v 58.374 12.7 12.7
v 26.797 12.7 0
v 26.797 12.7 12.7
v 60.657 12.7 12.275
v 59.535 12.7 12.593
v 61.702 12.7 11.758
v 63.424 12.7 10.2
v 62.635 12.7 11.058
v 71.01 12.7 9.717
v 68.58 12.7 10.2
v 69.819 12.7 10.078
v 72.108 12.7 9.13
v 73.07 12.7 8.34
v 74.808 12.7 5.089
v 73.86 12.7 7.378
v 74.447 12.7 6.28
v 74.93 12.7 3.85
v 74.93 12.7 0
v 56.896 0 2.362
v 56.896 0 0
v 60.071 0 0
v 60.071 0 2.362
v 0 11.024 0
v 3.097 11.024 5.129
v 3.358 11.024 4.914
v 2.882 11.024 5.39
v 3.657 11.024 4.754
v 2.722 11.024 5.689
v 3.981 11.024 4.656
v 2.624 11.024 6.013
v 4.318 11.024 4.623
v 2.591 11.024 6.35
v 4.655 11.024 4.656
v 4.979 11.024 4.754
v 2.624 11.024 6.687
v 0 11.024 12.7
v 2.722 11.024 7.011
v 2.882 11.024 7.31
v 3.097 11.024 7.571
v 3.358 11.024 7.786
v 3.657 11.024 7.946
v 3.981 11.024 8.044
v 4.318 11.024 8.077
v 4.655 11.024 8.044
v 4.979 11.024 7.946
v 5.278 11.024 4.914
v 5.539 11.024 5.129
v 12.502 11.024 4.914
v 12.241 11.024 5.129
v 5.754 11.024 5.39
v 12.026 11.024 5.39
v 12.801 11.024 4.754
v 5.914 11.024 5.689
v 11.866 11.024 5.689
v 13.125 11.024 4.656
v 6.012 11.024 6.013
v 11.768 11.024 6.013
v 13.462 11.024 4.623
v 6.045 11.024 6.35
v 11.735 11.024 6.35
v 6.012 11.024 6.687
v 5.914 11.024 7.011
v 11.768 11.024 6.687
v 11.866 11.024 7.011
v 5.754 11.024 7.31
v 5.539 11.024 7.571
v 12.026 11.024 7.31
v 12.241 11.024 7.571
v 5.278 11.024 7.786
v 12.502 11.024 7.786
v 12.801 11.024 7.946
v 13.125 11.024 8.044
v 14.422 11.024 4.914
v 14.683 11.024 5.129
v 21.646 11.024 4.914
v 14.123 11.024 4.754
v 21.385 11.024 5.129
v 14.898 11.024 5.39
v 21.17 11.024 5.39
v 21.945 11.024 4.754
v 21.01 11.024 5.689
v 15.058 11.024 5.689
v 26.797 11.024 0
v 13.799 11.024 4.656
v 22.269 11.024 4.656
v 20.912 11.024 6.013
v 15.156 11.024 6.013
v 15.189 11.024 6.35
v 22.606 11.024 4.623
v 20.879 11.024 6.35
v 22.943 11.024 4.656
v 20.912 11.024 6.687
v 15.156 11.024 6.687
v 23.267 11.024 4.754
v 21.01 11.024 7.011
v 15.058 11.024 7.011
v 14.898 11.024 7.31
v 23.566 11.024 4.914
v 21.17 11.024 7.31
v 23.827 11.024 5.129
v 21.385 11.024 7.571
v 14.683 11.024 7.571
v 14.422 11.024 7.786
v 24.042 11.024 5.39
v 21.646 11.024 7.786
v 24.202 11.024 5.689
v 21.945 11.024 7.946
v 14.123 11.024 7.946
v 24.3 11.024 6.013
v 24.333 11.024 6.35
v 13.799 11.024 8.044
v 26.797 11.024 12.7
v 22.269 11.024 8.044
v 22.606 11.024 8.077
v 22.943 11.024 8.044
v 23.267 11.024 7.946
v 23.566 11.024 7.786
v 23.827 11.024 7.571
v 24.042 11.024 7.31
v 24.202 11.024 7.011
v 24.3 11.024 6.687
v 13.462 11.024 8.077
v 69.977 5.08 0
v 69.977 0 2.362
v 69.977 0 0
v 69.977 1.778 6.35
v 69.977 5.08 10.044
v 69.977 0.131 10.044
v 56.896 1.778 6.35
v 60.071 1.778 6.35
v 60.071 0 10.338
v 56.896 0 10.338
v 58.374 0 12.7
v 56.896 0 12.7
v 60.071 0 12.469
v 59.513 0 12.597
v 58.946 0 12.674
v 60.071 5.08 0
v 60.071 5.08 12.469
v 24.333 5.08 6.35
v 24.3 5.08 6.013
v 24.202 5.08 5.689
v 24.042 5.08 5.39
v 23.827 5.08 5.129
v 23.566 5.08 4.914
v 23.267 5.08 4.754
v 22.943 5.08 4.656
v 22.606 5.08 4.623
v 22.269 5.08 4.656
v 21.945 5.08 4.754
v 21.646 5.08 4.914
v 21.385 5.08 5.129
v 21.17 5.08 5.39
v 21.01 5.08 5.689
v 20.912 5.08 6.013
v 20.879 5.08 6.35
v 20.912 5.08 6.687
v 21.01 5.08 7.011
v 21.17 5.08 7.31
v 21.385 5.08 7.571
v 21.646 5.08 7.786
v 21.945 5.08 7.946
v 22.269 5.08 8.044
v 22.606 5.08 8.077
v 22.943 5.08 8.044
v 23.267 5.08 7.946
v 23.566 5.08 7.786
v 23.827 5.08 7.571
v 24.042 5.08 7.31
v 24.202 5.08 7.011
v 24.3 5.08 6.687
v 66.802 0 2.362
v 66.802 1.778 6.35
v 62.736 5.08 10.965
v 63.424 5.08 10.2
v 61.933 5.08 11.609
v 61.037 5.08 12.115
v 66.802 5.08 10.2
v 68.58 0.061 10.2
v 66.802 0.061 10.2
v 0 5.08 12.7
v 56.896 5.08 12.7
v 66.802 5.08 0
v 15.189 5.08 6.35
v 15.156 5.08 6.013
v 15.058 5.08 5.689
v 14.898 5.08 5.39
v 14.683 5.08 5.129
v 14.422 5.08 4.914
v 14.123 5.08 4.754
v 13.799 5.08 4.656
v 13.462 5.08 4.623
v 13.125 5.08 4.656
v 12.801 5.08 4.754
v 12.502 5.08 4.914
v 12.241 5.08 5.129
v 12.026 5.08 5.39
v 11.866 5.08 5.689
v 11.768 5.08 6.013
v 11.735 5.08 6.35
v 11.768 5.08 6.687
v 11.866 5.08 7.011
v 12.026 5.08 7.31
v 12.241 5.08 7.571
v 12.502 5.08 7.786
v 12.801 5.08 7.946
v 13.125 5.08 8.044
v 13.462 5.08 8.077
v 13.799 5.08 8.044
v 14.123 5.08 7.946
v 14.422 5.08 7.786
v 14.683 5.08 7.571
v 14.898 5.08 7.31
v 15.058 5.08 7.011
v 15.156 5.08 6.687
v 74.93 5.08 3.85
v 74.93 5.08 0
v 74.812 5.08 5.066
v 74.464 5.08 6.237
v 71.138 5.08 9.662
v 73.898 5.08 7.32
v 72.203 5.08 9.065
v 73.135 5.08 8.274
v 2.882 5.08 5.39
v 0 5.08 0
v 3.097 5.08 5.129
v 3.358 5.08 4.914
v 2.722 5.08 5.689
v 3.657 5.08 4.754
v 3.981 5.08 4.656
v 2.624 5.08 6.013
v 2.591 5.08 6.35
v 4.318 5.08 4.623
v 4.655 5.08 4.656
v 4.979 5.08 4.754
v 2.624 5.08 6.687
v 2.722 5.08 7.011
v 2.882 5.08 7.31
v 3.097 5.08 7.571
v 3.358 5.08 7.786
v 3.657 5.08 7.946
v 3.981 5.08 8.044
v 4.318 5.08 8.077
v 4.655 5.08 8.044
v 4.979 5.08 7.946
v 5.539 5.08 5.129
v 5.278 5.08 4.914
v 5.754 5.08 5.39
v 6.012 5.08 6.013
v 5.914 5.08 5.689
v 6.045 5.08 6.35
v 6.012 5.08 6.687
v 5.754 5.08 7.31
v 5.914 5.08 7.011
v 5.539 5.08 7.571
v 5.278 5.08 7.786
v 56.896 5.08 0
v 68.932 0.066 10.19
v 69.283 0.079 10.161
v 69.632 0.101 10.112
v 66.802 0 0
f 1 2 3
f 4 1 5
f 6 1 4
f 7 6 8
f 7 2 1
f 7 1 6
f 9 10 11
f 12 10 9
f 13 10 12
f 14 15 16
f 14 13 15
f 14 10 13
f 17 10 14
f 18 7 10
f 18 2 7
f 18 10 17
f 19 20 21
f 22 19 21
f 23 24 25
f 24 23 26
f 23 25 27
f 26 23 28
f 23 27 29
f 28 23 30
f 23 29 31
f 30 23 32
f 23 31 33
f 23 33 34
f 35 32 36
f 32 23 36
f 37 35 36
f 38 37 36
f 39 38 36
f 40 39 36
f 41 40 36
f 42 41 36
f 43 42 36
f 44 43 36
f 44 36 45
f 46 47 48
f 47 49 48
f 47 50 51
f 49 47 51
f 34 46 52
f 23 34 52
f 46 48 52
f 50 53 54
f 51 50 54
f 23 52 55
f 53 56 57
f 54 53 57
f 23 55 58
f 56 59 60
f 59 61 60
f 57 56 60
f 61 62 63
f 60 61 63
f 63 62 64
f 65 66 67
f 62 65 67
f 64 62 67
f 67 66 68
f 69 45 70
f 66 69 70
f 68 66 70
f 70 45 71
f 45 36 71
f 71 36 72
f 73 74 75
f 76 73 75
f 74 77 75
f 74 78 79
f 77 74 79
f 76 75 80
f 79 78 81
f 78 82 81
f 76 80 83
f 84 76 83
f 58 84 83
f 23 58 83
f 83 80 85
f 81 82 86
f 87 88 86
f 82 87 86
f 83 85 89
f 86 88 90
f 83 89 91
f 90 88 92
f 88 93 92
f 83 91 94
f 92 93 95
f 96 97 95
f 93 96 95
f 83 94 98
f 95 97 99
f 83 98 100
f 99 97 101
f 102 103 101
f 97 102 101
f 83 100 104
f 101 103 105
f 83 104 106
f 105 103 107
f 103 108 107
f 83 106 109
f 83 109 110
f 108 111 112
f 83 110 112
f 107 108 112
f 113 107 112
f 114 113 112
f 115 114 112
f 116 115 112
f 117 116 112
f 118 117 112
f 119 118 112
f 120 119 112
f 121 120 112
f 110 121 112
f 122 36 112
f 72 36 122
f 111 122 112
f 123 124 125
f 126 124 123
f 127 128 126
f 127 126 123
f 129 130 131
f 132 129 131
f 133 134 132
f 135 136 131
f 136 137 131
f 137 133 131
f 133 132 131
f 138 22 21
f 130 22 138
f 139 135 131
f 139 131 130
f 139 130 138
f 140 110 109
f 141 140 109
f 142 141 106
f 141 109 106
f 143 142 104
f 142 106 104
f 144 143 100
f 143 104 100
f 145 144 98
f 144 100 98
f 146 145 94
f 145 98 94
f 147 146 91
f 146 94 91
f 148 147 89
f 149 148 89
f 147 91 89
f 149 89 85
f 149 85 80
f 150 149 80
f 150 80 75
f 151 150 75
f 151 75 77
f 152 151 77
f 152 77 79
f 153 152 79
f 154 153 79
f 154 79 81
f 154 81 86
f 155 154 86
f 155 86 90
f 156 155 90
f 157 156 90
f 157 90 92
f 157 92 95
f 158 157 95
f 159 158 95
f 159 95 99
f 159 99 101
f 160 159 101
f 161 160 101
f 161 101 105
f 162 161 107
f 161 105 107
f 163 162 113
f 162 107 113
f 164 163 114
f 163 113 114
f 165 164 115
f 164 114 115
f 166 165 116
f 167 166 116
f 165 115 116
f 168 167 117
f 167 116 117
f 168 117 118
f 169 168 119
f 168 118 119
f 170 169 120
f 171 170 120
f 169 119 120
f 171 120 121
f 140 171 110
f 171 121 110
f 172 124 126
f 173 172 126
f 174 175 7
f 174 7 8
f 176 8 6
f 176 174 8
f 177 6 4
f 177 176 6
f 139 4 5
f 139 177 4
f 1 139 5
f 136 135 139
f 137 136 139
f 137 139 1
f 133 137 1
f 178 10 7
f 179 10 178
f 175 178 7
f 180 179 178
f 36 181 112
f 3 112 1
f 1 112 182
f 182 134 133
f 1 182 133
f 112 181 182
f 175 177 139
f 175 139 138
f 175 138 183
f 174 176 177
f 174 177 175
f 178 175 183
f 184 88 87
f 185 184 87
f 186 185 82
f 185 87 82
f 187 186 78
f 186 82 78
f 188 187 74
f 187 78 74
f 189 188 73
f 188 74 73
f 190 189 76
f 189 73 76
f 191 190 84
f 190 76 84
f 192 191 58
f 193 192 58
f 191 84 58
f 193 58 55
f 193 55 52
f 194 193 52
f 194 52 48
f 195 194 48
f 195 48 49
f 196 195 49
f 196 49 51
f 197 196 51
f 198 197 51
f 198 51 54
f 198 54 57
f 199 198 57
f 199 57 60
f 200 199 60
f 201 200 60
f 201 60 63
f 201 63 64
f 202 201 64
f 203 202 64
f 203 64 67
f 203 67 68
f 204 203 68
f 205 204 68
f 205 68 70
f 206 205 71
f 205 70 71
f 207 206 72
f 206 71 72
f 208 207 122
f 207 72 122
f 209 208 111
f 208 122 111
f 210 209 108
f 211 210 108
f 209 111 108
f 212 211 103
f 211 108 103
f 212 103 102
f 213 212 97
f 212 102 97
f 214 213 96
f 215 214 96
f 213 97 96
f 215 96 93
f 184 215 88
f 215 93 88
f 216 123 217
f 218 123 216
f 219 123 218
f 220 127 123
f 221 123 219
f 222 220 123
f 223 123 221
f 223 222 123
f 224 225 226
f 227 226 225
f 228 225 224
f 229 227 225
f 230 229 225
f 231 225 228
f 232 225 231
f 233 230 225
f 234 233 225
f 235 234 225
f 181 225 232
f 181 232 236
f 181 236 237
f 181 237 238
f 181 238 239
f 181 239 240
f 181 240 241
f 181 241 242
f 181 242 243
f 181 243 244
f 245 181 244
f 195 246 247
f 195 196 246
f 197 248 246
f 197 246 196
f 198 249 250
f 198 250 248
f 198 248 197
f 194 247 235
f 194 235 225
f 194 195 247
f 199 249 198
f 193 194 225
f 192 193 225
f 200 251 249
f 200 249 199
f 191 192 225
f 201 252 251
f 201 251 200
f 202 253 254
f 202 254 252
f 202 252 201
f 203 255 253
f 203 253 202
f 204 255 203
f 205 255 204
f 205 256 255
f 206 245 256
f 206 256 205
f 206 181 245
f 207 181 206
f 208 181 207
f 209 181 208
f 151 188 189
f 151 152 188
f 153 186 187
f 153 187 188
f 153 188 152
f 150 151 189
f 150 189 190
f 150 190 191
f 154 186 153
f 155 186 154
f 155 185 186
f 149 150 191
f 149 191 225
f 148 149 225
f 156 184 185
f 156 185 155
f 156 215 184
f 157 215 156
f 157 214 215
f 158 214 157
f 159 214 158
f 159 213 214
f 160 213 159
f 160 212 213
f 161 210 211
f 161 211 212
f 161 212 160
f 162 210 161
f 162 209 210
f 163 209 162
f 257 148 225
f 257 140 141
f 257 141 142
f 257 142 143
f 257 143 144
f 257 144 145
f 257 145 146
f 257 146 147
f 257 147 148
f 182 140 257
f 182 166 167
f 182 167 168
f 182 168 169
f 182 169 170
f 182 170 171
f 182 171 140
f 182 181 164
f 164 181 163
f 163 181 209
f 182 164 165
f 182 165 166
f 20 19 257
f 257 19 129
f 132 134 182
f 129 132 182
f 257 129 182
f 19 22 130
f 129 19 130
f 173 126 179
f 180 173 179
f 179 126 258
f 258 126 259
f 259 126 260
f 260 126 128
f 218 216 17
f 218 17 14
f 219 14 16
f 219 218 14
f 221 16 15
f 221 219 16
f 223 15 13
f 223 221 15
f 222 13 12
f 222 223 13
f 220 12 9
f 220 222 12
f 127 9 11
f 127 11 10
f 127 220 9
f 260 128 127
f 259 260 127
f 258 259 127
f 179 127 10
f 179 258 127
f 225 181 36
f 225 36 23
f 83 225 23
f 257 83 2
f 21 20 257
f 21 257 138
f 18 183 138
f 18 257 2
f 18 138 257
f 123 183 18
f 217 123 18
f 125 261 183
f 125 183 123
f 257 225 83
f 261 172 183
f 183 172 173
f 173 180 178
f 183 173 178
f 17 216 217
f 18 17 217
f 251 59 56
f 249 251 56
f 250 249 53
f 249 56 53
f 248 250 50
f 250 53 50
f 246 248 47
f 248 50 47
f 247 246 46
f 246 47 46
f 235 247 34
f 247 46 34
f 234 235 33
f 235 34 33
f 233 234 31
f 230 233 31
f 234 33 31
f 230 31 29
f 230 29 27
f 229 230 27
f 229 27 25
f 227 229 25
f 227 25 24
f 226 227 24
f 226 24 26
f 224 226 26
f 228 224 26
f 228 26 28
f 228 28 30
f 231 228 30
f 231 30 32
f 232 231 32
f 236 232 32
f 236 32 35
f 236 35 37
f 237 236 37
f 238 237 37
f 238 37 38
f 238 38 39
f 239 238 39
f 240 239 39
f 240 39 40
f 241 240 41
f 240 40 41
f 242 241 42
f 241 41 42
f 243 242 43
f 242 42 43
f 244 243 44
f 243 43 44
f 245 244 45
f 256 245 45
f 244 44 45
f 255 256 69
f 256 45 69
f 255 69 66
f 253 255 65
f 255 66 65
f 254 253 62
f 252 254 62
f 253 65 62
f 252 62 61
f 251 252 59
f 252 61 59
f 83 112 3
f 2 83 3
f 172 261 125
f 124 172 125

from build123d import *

# Parameters (mm, degrees)
CROQUIS1_W              = 74.93
CROQUIS1_H              = 12.7
SALIENTE_EXTRUIR1_DEPTH = 12.7
CROQUIS2_W              = 26.797
CROQUIS2_H              = 1.6764
CROQUIS2_W_2            = 6.731
CROQUIS2_H_2            = 5.08
CROQUIS2_W_3            = 56.896
CROQUIS2_W_4            = 4.953
CORTAR_EXTRUIR1_DEPTH   = 78.052481466
TALADRO_ROSCADO_8_321_D = 3.4544
CORTAR_EXTRUIR2_DEPTH   = 78.052481466
CORTAR_EXTRUIR3_DEPTH   = 78.052481466


with BuildPart() as part:
    # Croquis1 → Saliente-Extruir1 (new body)
    with BuildSketch(Plane(origin=(0, 0, 0), x_dir=(1, 0, 0), z_dir=(0, 1, 0))):
        with Locations((37.465, -6.35)):
            Rectangle(CROQUIS1_W, CROQUIS1_H)
    extrude(amount=SALIENTE_EXTRUIR1_DEPTH)

    # Croquis2 → Cortar-Extruir1 (cut, through all)
    with BuildSketch(Plane.XY.offset(12.7)):
        with Locations((13.3985, 11.8618)):
            Rectangle(CROQUIS2_W, CROQUIS2_H)
        with Locations((63.4365, 2.54)):
            Rectangle(CROQUIS2_W_2, CROQUIS2_H_2)
        with Locations((28.448, 2.54)):
            Rectangle(CROQUIS2_W_3, CROQUIS2_H_2)
        with Locations((72.4535, 2.54)):
            Rectangle(CROQUIS2_W_4, CROQUIS2_H_2)
    extrude(amount=-CORTAR_EXTRUIR1_DEPTH, mode=Mode.SUBTRACT)

    # Taladro roscado #8-321 (through all)
    with Locations(Plane(origin=(0, 5.08, 0), x_dir=(-1, 0, 0), z_dir=(0, -1, 0))):
        with Locations((-4.318, -6.35), (-13.462, -6.35), (-22.606, -6.35)):
            Hole(TALADRO_ROSCADO_8_321_D / 2)

    # Croquis6 → Cortar-Extruir2 (cut, through all)
    with BuildSketch(Plane.XZ):
        with BuildLine():
            Line((68.58, 10.2), (63.4238, 10.2))
            ThreePointArc((63.4238, 10.2), (61.191404448, 12.04078202), (58.374047531, 12.7))
            Line((58.374047531, 12.7), (74.93, 12.7))
            Line((74.93, 12.7), (74.93, 3.85))
            ThreePointArc((74.93, 3.85), (73.070128061, 8.340128061), (68.58, 10.2))
        make_face()
    extrude(amount=-CORTAR_EXTRUIR2_DEPTH, mode=Mode.SUBTRACT)

    # Croquis7 → Cortar-Extruir3 (cut, through all)
    with BuildSketch(Plane(origin=(74.93, 0, 0), x_dir=(0, 0, -1), z_dir=(1, 0, 0))):
        Polygon((-2.3622, 0), (-6.35, 1.778), (-10.3378, 0), align=None)
    extrude(amount=-CORTAR_EXTRUIR3_DEPTH, mode=Mode.SUBTRACT)


solid = part.part
